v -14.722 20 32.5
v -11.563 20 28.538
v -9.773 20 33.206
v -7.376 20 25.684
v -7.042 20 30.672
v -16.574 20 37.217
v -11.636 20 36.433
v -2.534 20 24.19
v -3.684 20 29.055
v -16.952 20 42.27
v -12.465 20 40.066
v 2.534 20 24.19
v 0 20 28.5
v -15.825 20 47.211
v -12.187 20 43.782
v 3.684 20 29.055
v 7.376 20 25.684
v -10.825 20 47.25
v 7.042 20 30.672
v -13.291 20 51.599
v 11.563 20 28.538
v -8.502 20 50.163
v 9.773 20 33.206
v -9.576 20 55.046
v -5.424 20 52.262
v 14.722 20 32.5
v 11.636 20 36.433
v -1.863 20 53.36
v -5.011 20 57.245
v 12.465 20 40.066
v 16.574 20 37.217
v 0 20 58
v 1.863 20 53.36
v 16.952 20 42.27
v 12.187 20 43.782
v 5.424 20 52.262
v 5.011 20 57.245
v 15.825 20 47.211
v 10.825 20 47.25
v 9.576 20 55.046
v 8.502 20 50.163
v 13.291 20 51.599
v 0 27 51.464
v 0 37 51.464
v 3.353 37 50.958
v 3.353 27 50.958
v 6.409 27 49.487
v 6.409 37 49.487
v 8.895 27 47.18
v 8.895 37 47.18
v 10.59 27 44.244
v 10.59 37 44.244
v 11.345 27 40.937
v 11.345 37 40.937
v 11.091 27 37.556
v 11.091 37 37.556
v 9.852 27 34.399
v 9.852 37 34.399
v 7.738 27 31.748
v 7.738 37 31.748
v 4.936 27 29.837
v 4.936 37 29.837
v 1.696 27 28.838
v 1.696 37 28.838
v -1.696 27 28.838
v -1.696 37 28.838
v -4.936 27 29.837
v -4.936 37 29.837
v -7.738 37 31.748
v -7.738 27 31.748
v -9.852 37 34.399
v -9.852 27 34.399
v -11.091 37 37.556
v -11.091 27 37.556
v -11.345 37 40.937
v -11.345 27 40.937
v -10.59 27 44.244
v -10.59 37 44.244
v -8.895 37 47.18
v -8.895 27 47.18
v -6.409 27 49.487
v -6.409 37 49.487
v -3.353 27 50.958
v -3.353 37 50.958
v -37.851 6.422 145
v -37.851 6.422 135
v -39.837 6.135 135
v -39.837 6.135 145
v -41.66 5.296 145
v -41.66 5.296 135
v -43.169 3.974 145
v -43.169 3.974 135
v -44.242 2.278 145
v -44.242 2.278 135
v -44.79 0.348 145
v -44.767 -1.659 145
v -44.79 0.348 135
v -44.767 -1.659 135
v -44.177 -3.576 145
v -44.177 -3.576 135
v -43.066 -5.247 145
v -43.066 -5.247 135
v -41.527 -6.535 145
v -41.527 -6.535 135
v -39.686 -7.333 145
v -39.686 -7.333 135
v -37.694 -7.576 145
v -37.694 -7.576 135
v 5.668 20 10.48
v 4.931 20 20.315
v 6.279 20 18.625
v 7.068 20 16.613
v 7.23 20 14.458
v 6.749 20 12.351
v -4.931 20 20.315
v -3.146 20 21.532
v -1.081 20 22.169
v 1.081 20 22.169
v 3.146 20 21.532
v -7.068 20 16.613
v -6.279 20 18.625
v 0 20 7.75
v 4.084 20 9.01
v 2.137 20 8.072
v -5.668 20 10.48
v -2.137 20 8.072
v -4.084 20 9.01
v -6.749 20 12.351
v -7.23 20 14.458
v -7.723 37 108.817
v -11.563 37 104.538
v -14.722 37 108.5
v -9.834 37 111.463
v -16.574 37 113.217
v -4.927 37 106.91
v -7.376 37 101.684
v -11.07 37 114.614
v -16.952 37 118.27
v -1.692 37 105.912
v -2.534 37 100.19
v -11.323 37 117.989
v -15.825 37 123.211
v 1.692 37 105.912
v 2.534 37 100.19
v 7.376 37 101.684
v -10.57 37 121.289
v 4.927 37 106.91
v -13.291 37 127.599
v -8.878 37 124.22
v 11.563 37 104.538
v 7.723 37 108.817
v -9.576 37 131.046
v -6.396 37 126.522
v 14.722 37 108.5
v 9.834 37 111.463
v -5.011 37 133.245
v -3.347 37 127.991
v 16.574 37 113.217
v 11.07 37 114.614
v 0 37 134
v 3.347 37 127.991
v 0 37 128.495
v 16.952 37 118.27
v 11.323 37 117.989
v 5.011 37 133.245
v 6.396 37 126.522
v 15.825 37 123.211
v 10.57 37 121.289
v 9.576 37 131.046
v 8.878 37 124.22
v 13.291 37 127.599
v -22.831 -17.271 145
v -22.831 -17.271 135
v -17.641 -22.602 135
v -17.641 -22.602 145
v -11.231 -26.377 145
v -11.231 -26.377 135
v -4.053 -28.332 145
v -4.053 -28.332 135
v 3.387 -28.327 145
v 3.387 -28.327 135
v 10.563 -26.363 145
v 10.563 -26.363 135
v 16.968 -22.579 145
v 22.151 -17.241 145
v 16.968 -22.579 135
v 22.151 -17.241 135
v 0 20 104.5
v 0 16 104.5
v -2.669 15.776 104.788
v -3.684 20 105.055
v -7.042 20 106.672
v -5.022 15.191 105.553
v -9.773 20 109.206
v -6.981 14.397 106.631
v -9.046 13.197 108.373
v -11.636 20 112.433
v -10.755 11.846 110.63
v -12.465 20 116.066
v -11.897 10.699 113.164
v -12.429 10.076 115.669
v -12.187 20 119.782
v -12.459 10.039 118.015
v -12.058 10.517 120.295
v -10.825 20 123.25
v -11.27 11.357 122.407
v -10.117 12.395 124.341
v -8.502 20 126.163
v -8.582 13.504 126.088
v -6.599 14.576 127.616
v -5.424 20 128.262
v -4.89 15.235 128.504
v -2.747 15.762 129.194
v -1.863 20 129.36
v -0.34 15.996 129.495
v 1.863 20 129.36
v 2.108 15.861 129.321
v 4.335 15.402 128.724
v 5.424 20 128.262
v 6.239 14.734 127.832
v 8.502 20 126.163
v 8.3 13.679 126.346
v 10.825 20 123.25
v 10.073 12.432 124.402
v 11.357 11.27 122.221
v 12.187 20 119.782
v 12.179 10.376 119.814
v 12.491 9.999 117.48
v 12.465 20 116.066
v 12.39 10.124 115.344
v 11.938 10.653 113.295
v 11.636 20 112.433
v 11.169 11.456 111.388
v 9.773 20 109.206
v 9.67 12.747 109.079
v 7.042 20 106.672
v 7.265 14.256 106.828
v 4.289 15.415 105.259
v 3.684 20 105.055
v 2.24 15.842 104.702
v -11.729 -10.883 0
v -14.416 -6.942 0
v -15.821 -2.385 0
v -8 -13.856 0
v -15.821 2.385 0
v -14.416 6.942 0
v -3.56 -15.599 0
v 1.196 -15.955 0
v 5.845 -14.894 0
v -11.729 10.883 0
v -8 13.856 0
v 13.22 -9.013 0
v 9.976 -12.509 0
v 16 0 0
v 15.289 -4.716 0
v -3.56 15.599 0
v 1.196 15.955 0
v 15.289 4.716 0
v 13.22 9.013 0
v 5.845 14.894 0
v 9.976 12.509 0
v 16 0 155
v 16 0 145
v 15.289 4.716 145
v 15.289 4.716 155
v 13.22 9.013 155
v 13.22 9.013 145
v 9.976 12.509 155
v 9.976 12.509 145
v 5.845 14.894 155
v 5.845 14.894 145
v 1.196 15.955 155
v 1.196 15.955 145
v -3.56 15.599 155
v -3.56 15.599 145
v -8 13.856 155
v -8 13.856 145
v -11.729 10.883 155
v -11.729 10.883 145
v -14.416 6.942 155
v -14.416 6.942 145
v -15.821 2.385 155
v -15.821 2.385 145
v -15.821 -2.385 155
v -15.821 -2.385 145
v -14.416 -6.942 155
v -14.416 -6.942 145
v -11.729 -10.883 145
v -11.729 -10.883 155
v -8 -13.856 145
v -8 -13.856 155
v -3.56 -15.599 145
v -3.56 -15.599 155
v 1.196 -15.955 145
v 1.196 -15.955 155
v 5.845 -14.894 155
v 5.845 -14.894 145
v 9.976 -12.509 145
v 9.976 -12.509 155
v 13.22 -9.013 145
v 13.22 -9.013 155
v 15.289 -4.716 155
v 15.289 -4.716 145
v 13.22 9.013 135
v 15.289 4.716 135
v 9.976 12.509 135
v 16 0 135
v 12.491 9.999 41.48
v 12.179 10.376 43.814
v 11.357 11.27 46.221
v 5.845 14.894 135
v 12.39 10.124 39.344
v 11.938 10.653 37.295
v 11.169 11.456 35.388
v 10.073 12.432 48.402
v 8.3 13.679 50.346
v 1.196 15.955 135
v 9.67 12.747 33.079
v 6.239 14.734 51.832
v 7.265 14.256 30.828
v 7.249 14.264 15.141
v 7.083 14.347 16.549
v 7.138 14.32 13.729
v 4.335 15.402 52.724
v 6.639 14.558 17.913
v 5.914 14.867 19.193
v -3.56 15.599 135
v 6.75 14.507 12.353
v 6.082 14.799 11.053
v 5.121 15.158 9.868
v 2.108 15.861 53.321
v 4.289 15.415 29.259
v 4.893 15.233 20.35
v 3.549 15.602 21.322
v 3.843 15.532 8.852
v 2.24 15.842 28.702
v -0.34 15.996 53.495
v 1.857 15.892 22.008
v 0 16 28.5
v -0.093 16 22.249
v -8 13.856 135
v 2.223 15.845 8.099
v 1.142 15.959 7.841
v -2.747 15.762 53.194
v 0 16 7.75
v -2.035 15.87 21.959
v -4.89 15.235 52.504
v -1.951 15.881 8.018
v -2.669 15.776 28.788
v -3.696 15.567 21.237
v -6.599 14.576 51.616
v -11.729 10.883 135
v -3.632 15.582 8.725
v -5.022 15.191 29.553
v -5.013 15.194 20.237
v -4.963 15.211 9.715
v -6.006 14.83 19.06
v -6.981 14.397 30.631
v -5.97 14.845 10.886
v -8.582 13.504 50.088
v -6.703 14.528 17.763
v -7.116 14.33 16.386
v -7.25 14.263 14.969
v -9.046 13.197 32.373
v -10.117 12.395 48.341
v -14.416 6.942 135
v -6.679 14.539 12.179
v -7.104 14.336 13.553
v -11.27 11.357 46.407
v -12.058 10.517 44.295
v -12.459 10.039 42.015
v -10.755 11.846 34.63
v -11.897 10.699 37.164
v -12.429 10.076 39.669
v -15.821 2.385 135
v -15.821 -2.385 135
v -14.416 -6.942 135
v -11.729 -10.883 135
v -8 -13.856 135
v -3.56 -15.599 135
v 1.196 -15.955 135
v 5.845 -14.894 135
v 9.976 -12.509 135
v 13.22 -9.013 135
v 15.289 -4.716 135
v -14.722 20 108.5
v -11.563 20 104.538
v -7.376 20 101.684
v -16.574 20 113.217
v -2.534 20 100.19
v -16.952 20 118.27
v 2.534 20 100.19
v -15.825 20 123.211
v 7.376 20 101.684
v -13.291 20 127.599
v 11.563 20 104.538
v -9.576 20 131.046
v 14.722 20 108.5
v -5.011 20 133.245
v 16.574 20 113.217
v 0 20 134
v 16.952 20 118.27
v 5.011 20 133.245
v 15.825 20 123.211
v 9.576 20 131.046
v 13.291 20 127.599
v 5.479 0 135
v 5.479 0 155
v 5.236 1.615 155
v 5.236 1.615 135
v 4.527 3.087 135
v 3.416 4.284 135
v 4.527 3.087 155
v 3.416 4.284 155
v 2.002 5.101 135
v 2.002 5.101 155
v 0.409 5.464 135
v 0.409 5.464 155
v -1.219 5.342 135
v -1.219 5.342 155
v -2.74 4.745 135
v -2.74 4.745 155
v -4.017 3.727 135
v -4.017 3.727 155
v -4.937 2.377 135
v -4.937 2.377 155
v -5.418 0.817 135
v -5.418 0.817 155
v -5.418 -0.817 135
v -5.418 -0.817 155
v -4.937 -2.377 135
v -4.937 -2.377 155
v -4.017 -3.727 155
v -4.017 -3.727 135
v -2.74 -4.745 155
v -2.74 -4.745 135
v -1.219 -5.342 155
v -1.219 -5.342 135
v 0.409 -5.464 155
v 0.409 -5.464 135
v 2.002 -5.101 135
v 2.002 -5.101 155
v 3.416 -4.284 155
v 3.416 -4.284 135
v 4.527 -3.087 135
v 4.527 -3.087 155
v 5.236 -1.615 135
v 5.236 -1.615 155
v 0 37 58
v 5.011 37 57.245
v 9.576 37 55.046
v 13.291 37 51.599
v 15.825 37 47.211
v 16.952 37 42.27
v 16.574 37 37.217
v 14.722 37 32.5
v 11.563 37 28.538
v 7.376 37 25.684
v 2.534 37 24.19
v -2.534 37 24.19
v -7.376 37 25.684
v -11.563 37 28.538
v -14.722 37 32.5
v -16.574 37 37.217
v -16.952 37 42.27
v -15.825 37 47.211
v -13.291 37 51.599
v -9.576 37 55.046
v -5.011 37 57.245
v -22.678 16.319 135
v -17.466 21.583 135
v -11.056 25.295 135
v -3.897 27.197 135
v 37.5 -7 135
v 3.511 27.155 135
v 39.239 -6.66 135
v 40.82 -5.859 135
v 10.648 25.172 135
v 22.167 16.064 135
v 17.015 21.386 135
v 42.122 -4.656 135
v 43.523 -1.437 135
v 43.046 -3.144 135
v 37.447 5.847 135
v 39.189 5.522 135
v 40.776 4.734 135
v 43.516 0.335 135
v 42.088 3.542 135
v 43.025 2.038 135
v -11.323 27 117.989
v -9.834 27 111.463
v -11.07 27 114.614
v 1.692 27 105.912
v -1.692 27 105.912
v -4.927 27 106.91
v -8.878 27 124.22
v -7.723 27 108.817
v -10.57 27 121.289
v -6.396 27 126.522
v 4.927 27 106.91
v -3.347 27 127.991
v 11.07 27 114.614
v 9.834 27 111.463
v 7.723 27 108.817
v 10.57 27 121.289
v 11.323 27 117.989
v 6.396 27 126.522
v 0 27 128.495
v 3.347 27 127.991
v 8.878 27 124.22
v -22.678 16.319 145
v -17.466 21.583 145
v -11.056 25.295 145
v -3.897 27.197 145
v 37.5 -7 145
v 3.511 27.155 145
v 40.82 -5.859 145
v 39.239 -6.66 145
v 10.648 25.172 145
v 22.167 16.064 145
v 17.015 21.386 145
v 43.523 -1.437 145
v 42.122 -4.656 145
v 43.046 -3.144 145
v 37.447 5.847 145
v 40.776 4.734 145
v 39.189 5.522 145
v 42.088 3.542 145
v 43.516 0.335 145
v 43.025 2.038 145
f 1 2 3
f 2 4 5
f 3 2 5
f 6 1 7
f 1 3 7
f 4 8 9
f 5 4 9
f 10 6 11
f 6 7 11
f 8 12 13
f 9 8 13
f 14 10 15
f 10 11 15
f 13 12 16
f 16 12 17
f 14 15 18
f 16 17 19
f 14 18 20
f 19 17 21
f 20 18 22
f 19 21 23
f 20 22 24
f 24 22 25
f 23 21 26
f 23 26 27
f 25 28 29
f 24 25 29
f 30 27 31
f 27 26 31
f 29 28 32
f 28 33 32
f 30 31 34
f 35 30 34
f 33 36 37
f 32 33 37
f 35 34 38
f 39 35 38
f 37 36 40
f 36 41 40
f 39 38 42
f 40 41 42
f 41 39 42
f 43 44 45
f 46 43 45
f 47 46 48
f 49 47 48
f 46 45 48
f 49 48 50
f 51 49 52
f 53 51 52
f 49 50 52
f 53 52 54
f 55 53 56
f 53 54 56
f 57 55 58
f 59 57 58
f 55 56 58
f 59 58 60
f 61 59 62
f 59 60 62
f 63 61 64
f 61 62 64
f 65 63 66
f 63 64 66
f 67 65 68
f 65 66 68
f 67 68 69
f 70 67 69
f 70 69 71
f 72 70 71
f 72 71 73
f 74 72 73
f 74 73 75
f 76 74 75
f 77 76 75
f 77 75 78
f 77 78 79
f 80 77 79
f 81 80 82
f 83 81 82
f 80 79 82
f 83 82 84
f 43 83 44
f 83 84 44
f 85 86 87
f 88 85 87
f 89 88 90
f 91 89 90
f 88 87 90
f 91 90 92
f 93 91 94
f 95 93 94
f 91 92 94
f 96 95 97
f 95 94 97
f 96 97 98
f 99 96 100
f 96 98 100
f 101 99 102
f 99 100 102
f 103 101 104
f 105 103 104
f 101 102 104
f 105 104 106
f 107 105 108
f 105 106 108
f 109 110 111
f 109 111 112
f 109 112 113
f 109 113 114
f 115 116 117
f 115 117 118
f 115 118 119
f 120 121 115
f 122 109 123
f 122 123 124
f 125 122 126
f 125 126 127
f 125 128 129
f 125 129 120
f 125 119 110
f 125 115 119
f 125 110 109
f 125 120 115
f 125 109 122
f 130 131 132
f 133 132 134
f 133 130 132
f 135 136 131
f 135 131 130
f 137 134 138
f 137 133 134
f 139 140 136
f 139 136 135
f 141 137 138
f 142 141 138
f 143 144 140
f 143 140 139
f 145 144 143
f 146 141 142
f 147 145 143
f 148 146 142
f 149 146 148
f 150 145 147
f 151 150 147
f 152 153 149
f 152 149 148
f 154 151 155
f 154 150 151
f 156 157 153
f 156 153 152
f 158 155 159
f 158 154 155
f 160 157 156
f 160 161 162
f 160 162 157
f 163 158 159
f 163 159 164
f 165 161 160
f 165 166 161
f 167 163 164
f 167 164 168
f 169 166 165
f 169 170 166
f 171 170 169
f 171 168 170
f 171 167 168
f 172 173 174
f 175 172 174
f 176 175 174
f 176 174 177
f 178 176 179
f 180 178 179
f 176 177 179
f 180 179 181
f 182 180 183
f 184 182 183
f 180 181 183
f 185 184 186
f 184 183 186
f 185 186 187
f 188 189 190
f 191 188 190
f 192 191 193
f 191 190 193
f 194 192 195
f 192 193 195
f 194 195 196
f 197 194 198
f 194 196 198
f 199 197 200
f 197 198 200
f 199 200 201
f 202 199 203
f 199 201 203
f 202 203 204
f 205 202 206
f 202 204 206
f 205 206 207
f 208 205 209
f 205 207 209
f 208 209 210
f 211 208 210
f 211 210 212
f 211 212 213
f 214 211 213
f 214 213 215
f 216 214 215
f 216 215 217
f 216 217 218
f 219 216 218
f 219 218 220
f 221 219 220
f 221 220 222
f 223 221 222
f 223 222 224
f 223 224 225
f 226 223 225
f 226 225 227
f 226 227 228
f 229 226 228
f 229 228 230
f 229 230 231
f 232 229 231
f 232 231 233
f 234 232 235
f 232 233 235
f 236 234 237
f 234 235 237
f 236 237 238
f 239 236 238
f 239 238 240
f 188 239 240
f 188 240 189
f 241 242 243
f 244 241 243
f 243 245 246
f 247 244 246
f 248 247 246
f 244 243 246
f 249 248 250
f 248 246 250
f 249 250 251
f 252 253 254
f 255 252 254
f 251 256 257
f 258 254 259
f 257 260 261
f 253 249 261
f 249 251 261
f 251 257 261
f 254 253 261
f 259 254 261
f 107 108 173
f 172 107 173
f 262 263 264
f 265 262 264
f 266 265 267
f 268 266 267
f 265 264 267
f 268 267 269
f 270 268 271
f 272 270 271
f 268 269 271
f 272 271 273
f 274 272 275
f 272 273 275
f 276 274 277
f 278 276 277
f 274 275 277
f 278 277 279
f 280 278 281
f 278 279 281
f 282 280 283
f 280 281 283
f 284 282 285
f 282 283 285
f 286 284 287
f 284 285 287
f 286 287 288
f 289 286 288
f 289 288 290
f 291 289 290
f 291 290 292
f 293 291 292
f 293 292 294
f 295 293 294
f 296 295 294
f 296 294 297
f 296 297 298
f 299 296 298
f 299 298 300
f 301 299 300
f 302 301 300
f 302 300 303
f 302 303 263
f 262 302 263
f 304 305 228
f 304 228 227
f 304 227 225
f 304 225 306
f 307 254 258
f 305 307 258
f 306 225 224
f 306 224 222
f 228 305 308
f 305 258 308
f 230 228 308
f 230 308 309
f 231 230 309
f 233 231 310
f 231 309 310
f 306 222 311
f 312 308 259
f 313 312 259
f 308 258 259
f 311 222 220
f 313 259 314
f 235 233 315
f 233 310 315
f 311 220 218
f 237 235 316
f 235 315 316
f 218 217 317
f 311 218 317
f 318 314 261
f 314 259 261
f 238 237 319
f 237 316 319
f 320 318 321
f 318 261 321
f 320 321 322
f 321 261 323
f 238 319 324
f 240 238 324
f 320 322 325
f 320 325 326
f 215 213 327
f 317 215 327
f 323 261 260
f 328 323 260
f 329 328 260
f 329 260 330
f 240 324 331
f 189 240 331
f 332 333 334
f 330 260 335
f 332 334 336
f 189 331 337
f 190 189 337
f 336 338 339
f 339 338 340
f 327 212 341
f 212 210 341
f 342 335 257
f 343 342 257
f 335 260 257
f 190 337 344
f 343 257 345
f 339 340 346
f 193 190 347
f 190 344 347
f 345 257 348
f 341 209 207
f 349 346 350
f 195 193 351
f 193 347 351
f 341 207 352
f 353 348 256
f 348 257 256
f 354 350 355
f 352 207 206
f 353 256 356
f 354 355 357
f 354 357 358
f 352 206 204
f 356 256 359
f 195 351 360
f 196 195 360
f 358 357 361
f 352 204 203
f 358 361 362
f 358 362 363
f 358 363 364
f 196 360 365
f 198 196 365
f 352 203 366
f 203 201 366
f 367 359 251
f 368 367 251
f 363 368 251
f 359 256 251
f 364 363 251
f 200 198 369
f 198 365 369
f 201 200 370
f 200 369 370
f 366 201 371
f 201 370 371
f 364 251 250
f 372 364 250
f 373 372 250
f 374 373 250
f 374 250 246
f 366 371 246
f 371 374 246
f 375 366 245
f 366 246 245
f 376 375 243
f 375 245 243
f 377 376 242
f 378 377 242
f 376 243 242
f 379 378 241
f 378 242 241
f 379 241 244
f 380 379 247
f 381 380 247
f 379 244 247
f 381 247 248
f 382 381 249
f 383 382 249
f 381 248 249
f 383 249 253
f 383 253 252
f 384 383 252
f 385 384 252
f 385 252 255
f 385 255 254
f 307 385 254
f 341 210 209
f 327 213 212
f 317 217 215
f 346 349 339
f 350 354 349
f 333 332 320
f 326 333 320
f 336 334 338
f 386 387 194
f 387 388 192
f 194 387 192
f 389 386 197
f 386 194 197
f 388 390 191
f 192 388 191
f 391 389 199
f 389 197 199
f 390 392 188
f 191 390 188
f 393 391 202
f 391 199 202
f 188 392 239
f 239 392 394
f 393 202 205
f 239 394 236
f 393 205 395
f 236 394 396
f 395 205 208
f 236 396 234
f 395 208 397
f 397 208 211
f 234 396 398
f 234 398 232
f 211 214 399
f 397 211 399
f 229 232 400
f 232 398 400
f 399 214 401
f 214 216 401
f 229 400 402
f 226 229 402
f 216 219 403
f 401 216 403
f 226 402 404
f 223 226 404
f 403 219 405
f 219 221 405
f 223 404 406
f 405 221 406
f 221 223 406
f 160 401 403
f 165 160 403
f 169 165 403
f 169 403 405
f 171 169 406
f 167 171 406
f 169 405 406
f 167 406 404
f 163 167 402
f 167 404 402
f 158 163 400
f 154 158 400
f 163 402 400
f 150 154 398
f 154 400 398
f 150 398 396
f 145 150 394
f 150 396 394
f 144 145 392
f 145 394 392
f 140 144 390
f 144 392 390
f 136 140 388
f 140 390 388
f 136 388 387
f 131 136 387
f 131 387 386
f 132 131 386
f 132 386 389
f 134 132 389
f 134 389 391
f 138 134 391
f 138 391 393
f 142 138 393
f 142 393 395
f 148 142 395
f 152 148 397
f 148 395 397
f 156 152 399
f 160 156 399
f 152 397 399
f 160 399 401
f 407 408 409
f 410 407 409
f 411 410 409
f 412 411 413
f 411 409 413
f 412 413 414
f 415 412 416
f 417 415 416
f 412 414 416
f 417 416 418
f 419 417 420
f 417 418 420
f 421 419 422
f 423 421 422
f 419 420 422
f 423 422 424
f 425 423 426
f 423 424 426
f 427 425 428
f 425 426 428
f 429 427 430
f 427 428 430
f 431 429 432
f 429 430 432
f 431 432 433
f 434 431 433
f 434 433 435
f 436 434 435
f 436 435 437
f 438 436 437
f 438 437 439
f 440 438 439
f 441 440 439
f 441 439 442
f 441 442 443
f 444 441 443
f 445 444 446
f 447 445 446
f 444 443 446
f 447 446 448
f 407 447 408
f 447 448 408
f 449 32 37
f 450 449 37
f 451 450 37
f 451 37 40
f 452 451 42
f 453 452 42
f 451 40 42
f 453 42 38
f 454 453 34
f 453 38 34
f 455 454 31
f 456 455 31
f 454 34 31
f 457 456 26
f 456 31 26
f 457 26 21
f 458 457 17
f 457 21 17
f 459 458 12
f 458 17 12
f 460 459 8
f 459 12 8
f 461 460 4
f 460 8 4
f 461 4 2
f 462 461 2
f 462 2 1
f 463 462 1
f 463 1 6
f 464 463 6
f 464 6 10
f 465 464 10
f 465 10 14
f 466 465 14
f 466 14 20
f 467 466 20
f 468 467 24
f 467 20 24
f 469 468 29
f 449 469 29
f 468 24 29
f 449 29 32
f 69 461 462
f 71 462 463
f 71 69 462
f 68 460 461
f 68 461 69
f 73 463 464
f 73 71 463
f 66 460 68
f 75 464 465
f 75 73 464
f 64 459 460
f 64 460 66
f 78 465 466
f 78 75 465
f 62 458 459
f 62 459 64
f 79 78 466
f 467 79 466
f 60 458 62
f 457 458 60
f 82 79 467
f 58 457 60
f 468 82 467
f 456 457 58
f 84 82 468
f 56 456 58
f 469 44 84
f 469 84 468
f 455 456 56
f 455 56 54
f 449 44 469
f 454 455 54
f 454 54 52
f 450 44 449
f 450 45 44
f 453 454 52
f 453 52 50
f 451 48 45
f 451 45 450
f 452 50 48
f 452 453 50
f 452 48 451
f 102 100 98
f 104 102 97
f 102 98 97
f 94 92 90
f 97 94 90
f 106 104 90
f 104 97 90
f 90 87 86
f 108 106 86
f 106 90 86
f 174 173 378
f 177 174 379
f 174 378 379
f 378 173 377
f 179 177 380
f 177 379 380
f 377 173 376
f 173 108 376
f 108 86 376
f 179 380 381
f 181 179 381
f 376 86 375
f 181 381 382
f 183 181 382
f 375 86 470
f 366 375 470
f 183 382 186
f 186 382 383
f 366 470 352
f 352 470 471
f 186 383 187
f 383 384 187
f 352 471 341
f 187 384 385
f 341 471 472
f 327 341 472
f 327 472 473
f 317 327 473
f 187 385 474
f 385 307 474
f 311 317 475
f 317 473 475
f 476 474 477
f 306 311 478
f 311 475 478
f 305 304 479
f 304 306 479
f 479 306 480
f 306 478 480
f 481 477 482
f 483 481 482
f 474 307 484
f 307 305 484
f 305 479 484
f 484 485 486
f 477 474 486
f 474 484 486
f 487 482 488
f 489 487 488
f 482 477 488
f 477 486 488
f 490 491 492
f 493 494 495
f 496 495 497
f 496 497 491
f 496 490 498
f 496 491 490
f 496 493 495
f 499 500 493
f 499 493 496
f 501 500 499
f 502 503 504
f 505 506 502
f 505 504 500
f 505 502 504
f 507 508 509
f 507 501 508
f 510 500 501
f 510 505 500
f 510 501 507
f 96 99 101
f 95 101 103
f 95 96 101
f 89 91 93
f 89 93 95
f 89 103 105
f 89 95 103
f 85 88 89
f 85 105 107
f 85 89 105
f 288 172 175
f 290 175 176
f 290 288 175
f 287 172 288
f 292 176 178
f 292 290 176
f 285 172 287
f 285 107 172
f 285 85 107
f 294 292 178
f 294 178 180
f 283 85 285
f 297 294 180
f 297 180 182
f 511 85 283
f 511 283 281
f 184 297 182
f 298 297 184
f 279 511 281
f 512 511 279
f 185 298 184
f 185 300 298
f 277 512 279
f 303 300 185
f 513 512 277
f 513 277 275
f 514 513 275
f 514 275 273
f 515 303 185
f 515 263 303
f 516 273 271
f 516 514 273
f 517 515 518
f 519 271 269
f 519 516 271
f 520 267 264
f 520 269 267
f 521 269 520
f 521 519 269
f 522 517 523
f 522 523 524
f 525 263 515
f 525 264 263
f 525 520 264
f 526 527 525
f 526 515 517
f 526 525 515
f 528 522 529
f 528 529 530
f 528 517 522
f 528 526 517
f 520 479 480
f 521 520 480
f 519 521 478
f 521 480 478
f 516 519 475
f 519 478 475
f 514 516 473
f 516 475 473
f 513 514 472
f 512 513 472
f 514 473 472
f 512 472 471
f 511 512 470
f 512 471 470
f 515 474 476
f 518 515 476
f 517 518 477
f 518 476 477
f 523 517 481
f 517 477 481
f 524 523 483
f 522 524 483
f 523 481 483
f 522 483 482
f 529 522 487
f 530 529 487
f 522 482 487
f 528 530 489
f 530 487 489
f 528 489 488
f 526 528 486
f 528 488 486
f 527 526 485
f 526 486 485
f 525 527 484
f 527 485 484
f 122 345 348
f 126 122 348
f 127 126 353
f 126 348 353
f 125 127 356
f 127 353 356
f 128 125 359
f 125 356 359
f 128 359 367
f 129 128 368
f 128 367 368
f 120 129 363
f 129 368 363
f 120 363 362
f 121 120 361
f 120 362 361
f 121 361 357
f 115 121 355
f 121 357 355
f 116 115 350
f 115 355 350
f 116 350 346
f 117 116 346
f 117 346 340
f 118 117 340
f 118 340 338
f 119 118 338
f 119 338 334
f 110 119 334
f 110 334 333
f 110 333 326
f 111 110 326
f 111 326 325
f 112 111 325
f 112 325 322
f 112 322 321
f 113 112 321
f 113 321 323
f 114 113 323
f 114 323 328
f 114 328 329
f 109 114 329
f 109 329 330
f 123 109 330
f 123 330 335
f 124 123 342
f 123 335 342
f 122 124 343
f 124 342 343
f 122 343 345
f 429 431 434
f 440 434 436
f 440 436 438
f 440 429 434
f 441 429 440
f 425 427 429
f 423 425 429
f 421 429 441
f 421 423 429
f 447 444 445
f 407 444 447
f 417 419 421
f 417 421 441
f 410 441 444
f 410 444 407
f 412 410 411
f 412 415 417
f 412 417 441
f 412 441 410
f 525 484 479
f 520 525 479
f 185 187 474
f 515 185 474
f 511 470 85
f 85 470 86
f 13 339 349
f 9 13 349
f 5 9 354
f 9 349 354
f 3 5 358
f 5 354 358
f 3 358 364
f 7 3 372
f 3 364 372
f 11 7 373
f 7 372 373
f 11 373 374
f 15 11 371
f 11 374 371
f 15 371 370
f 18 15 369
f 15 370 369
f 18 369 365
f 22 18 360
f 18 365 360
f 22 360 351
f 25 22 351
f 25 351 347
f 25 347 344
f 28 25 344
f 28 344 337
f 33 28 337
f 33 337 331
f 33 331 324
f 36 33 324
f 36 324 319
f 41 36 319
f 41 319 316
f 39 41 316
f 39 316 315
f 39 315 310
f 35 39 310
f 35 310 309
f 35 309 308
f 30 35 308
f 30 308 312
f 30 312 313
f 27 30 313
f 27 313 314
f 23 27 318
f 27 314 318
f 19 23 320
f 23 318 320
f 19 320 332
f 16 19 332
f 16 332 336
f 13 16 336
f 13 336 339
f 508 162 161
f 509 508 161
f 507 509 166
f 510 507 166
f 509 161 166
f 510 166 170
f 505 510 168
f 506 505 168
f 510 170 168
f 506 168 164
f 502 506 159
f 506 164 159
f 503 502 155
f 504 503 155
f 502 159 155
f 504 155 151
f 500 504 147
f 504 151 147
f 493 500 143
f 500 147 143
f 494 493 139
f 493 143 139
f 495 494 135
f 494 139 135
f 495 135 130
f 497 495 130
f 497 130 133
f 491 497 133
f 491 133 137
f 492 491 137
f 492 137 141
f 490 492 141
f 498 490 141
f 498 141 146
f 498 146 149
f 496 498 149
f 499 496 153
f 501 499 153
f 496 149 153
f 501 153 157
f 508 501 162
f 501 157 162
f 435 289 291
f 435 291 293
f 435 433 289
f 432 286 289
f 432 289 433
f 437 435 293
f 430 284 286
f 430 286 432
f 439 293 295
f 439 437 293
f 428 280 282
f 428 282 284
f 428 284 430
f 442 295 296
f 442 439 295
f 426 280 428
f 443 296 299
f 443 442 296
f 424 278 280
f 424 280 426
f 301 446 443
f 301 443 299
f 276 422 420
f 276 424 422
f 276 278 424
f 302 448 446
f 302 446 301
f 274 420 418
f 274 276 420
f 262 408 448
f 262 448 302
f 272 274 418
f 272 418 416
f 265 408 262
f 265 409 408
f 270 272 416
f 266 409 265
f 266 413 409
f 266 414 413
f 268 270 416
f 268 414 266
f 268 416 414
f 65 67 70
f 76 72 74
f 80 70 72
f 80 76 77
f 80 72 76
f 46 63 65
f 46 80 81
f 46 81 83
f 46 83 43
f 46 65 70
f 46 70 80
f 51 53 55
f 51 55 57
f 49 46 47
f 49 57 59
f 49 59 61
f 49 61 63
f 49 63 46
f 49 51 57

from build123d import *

# Parameters (mm, degrees)
SKIZZE1_R                       = 16
AUFSATZ_LINEAR_AUSTRAGEN1_DEPTH = 135
SKIZZE2_R                       = 7.25
AUFSATZ_LINEAR_AUSTRAGEN2_DEPTH = 20
SKIZZE4_R                       = 12.5
AUFSATZ_LINEAR_AUSTRAGEN3_DEPTH = 20
SKIZZE7_R                       = 16
AUFSATZ_LINEAR_AUSTRAGEN4_DEPTH = 10
SKIZZE8_R                       = 17
AUFSATZ_LINEAR_AUSTRAGEN5_DEPTH = 17
SKIZZE9_R                       = 11.376613665
SKIZZE9_R_2                     = 11.354918218
SCHNITT_LINEAR_AUSTRAGEN2_DEPTH = 10
SKIZZE10_R                      = 16
AUFSATZ_LINEAR_AUSTRAGEN6_DEPTH = 20
SKIZZE11_R                      = 5.479403349
SCHNITT_LINEAR_AUSTRAGEN3_DEPTH = 20


with BuildPart() as part:
    # Skizze1 → Aufsatz-Linear austragen1 (new body)
    with BuildSketch(Plane.XY):
        Circle(SKIZZE1_R)
    extrude(amount=AUFSATZ_LINEAR_AUSTRAGEN1_DEPTH)

    # Skizze2 → Aufsatz-Linear austragen2 (add)
    with BuildSketch(Plane(origin=(0, 0, 0), x_dir=(1, 0, 0), z_dir=(0, 1, 0))):
        with Locations(Location((0, -15, 0), (0, 0, 90))):
            Circle(SKIZZE2_R)
    extrude(amount=AUFSATZ_LINEAR_AUSTRAGEN2_DEPTH)

    # Skizze4 → Aufsatz-Linear austragen3 (add)
    with BuildSketch(Plane(origin=(0, 0, 0), x_dir=(1, 0, 0), z_dir=(0, 1, 0))):
        with Locations(Location((0, -41, 0), (0, 0, 90))):
            Circle(SKIZZE4_R)
        with Locations(Location((0, -117, 0), (0, 0, 90))):
            Circle(SKIZZE4_R)
    extrude(amount=AUFSATZ_LINEAR_AUSTRAGEN3_DEPTH)

    # Skizze8 → Aufsatz-Linear austragen5 (add)
    with BuildSketch(Plane(origin=(0, 20, 0), x_dir=(1, 0, 0), z_dir=(0, 1, 0))):
        with Locations(Location((0, -41, 0), (0, 0, 270))):
            Circle(SKIZZE8_R)
        with Locations(Location((0, -117, 0), (0, 0, 270))):
            Circle(SKIZZE8_R)
    extrude(amount=AUFSATZ_LINEAR_AUSTRAGEN5_DEPTH)

    # Skizze9 → Schnitt-Linear austragen2 (cut)
    with BuildSketch(Plane(origin=(0, 37, 0), x_dir=(1, 0, 0), z_dir=(0, 1, 0))):
        with Locations(Location((0, -40.087207053, 0), (0, 0, 270))):
            Circle(SKIZZE9_R)
        with Locations(Location((0, -117.14037352, 0), (0, 0, 270))):
            Circle(SKIZZE9_R_2)
    extrude(amount=-SCHNITT_LINEAR_AUSTRAGEN2_DEPTH, mode=Mode.SUBTRACT)



with BuildPart() as body_2:
    # Skizze7 → Aufsatz-Linear austragen4 (new body)
    with BuildSketch(Plane.XY.offset(135)):
        with BuildLine():
            Line((22.150629915, -17.24109716), (37.5, -7))
            ThreePointArc((37.5, -7), (43.58064746, -0.550964854), (37.446578261, 5.847278882))
            Line((37.446578261, 5.847278882), (22.167008351, 16.063537827))
            ThreePointArc((22.167008351, 16.063537827), (-0.191707942, 27.421836078), (-22.678353656, 16.318958162))
            Line((-22.678353656, 16.318958162), (-37.851181588, 6.422290222))
            ThreePointArc((-37.851181588, 6.422290222), (-44.850742391, -0.656122578), (-37.694365828, -7.575953044))
            Line((-37.694365828, -7.575953044), (-22.830978008, -17.270784777))
            ThreePointArc((-22.830978008, -17.270784777), (-0.332701744, -28.57770368), (22.150629915, -17.24109716))
        make_face()
        Circle(SKIZZE7_R, mode=Mode.SUBTRACT)
    extrude(amount=AUFSATZ_LINEAR_AUSTRAGEN4_DEPTH)


with BuildPart() as part_1:
    add(part.part)

    add(body_2.part)  # Aufsatz-Linear austragen6 merges body 2
    # Skizze10 → Aufsatz-Linear austragen6 (add)
    with BuildSketch(Plane.XY.offset(135)):
        Circle(SKIZZE10_R)
    extrude(amount=AUFSATZ_LINEAR_AUSTRAGEN6_DEPTH)

    # Skizze11 → Schnitt-Linear austragen3 (cut)
    with BuildSketch(Plane.XY.offset(155)):
        Circle(SKIZZE11_R)
    extrude(amount=-SCHNITT_LINEAR_AUSTRAGEN3_DEPTH, mode=Mode.SUBTRACT)


solid = part_1.part
